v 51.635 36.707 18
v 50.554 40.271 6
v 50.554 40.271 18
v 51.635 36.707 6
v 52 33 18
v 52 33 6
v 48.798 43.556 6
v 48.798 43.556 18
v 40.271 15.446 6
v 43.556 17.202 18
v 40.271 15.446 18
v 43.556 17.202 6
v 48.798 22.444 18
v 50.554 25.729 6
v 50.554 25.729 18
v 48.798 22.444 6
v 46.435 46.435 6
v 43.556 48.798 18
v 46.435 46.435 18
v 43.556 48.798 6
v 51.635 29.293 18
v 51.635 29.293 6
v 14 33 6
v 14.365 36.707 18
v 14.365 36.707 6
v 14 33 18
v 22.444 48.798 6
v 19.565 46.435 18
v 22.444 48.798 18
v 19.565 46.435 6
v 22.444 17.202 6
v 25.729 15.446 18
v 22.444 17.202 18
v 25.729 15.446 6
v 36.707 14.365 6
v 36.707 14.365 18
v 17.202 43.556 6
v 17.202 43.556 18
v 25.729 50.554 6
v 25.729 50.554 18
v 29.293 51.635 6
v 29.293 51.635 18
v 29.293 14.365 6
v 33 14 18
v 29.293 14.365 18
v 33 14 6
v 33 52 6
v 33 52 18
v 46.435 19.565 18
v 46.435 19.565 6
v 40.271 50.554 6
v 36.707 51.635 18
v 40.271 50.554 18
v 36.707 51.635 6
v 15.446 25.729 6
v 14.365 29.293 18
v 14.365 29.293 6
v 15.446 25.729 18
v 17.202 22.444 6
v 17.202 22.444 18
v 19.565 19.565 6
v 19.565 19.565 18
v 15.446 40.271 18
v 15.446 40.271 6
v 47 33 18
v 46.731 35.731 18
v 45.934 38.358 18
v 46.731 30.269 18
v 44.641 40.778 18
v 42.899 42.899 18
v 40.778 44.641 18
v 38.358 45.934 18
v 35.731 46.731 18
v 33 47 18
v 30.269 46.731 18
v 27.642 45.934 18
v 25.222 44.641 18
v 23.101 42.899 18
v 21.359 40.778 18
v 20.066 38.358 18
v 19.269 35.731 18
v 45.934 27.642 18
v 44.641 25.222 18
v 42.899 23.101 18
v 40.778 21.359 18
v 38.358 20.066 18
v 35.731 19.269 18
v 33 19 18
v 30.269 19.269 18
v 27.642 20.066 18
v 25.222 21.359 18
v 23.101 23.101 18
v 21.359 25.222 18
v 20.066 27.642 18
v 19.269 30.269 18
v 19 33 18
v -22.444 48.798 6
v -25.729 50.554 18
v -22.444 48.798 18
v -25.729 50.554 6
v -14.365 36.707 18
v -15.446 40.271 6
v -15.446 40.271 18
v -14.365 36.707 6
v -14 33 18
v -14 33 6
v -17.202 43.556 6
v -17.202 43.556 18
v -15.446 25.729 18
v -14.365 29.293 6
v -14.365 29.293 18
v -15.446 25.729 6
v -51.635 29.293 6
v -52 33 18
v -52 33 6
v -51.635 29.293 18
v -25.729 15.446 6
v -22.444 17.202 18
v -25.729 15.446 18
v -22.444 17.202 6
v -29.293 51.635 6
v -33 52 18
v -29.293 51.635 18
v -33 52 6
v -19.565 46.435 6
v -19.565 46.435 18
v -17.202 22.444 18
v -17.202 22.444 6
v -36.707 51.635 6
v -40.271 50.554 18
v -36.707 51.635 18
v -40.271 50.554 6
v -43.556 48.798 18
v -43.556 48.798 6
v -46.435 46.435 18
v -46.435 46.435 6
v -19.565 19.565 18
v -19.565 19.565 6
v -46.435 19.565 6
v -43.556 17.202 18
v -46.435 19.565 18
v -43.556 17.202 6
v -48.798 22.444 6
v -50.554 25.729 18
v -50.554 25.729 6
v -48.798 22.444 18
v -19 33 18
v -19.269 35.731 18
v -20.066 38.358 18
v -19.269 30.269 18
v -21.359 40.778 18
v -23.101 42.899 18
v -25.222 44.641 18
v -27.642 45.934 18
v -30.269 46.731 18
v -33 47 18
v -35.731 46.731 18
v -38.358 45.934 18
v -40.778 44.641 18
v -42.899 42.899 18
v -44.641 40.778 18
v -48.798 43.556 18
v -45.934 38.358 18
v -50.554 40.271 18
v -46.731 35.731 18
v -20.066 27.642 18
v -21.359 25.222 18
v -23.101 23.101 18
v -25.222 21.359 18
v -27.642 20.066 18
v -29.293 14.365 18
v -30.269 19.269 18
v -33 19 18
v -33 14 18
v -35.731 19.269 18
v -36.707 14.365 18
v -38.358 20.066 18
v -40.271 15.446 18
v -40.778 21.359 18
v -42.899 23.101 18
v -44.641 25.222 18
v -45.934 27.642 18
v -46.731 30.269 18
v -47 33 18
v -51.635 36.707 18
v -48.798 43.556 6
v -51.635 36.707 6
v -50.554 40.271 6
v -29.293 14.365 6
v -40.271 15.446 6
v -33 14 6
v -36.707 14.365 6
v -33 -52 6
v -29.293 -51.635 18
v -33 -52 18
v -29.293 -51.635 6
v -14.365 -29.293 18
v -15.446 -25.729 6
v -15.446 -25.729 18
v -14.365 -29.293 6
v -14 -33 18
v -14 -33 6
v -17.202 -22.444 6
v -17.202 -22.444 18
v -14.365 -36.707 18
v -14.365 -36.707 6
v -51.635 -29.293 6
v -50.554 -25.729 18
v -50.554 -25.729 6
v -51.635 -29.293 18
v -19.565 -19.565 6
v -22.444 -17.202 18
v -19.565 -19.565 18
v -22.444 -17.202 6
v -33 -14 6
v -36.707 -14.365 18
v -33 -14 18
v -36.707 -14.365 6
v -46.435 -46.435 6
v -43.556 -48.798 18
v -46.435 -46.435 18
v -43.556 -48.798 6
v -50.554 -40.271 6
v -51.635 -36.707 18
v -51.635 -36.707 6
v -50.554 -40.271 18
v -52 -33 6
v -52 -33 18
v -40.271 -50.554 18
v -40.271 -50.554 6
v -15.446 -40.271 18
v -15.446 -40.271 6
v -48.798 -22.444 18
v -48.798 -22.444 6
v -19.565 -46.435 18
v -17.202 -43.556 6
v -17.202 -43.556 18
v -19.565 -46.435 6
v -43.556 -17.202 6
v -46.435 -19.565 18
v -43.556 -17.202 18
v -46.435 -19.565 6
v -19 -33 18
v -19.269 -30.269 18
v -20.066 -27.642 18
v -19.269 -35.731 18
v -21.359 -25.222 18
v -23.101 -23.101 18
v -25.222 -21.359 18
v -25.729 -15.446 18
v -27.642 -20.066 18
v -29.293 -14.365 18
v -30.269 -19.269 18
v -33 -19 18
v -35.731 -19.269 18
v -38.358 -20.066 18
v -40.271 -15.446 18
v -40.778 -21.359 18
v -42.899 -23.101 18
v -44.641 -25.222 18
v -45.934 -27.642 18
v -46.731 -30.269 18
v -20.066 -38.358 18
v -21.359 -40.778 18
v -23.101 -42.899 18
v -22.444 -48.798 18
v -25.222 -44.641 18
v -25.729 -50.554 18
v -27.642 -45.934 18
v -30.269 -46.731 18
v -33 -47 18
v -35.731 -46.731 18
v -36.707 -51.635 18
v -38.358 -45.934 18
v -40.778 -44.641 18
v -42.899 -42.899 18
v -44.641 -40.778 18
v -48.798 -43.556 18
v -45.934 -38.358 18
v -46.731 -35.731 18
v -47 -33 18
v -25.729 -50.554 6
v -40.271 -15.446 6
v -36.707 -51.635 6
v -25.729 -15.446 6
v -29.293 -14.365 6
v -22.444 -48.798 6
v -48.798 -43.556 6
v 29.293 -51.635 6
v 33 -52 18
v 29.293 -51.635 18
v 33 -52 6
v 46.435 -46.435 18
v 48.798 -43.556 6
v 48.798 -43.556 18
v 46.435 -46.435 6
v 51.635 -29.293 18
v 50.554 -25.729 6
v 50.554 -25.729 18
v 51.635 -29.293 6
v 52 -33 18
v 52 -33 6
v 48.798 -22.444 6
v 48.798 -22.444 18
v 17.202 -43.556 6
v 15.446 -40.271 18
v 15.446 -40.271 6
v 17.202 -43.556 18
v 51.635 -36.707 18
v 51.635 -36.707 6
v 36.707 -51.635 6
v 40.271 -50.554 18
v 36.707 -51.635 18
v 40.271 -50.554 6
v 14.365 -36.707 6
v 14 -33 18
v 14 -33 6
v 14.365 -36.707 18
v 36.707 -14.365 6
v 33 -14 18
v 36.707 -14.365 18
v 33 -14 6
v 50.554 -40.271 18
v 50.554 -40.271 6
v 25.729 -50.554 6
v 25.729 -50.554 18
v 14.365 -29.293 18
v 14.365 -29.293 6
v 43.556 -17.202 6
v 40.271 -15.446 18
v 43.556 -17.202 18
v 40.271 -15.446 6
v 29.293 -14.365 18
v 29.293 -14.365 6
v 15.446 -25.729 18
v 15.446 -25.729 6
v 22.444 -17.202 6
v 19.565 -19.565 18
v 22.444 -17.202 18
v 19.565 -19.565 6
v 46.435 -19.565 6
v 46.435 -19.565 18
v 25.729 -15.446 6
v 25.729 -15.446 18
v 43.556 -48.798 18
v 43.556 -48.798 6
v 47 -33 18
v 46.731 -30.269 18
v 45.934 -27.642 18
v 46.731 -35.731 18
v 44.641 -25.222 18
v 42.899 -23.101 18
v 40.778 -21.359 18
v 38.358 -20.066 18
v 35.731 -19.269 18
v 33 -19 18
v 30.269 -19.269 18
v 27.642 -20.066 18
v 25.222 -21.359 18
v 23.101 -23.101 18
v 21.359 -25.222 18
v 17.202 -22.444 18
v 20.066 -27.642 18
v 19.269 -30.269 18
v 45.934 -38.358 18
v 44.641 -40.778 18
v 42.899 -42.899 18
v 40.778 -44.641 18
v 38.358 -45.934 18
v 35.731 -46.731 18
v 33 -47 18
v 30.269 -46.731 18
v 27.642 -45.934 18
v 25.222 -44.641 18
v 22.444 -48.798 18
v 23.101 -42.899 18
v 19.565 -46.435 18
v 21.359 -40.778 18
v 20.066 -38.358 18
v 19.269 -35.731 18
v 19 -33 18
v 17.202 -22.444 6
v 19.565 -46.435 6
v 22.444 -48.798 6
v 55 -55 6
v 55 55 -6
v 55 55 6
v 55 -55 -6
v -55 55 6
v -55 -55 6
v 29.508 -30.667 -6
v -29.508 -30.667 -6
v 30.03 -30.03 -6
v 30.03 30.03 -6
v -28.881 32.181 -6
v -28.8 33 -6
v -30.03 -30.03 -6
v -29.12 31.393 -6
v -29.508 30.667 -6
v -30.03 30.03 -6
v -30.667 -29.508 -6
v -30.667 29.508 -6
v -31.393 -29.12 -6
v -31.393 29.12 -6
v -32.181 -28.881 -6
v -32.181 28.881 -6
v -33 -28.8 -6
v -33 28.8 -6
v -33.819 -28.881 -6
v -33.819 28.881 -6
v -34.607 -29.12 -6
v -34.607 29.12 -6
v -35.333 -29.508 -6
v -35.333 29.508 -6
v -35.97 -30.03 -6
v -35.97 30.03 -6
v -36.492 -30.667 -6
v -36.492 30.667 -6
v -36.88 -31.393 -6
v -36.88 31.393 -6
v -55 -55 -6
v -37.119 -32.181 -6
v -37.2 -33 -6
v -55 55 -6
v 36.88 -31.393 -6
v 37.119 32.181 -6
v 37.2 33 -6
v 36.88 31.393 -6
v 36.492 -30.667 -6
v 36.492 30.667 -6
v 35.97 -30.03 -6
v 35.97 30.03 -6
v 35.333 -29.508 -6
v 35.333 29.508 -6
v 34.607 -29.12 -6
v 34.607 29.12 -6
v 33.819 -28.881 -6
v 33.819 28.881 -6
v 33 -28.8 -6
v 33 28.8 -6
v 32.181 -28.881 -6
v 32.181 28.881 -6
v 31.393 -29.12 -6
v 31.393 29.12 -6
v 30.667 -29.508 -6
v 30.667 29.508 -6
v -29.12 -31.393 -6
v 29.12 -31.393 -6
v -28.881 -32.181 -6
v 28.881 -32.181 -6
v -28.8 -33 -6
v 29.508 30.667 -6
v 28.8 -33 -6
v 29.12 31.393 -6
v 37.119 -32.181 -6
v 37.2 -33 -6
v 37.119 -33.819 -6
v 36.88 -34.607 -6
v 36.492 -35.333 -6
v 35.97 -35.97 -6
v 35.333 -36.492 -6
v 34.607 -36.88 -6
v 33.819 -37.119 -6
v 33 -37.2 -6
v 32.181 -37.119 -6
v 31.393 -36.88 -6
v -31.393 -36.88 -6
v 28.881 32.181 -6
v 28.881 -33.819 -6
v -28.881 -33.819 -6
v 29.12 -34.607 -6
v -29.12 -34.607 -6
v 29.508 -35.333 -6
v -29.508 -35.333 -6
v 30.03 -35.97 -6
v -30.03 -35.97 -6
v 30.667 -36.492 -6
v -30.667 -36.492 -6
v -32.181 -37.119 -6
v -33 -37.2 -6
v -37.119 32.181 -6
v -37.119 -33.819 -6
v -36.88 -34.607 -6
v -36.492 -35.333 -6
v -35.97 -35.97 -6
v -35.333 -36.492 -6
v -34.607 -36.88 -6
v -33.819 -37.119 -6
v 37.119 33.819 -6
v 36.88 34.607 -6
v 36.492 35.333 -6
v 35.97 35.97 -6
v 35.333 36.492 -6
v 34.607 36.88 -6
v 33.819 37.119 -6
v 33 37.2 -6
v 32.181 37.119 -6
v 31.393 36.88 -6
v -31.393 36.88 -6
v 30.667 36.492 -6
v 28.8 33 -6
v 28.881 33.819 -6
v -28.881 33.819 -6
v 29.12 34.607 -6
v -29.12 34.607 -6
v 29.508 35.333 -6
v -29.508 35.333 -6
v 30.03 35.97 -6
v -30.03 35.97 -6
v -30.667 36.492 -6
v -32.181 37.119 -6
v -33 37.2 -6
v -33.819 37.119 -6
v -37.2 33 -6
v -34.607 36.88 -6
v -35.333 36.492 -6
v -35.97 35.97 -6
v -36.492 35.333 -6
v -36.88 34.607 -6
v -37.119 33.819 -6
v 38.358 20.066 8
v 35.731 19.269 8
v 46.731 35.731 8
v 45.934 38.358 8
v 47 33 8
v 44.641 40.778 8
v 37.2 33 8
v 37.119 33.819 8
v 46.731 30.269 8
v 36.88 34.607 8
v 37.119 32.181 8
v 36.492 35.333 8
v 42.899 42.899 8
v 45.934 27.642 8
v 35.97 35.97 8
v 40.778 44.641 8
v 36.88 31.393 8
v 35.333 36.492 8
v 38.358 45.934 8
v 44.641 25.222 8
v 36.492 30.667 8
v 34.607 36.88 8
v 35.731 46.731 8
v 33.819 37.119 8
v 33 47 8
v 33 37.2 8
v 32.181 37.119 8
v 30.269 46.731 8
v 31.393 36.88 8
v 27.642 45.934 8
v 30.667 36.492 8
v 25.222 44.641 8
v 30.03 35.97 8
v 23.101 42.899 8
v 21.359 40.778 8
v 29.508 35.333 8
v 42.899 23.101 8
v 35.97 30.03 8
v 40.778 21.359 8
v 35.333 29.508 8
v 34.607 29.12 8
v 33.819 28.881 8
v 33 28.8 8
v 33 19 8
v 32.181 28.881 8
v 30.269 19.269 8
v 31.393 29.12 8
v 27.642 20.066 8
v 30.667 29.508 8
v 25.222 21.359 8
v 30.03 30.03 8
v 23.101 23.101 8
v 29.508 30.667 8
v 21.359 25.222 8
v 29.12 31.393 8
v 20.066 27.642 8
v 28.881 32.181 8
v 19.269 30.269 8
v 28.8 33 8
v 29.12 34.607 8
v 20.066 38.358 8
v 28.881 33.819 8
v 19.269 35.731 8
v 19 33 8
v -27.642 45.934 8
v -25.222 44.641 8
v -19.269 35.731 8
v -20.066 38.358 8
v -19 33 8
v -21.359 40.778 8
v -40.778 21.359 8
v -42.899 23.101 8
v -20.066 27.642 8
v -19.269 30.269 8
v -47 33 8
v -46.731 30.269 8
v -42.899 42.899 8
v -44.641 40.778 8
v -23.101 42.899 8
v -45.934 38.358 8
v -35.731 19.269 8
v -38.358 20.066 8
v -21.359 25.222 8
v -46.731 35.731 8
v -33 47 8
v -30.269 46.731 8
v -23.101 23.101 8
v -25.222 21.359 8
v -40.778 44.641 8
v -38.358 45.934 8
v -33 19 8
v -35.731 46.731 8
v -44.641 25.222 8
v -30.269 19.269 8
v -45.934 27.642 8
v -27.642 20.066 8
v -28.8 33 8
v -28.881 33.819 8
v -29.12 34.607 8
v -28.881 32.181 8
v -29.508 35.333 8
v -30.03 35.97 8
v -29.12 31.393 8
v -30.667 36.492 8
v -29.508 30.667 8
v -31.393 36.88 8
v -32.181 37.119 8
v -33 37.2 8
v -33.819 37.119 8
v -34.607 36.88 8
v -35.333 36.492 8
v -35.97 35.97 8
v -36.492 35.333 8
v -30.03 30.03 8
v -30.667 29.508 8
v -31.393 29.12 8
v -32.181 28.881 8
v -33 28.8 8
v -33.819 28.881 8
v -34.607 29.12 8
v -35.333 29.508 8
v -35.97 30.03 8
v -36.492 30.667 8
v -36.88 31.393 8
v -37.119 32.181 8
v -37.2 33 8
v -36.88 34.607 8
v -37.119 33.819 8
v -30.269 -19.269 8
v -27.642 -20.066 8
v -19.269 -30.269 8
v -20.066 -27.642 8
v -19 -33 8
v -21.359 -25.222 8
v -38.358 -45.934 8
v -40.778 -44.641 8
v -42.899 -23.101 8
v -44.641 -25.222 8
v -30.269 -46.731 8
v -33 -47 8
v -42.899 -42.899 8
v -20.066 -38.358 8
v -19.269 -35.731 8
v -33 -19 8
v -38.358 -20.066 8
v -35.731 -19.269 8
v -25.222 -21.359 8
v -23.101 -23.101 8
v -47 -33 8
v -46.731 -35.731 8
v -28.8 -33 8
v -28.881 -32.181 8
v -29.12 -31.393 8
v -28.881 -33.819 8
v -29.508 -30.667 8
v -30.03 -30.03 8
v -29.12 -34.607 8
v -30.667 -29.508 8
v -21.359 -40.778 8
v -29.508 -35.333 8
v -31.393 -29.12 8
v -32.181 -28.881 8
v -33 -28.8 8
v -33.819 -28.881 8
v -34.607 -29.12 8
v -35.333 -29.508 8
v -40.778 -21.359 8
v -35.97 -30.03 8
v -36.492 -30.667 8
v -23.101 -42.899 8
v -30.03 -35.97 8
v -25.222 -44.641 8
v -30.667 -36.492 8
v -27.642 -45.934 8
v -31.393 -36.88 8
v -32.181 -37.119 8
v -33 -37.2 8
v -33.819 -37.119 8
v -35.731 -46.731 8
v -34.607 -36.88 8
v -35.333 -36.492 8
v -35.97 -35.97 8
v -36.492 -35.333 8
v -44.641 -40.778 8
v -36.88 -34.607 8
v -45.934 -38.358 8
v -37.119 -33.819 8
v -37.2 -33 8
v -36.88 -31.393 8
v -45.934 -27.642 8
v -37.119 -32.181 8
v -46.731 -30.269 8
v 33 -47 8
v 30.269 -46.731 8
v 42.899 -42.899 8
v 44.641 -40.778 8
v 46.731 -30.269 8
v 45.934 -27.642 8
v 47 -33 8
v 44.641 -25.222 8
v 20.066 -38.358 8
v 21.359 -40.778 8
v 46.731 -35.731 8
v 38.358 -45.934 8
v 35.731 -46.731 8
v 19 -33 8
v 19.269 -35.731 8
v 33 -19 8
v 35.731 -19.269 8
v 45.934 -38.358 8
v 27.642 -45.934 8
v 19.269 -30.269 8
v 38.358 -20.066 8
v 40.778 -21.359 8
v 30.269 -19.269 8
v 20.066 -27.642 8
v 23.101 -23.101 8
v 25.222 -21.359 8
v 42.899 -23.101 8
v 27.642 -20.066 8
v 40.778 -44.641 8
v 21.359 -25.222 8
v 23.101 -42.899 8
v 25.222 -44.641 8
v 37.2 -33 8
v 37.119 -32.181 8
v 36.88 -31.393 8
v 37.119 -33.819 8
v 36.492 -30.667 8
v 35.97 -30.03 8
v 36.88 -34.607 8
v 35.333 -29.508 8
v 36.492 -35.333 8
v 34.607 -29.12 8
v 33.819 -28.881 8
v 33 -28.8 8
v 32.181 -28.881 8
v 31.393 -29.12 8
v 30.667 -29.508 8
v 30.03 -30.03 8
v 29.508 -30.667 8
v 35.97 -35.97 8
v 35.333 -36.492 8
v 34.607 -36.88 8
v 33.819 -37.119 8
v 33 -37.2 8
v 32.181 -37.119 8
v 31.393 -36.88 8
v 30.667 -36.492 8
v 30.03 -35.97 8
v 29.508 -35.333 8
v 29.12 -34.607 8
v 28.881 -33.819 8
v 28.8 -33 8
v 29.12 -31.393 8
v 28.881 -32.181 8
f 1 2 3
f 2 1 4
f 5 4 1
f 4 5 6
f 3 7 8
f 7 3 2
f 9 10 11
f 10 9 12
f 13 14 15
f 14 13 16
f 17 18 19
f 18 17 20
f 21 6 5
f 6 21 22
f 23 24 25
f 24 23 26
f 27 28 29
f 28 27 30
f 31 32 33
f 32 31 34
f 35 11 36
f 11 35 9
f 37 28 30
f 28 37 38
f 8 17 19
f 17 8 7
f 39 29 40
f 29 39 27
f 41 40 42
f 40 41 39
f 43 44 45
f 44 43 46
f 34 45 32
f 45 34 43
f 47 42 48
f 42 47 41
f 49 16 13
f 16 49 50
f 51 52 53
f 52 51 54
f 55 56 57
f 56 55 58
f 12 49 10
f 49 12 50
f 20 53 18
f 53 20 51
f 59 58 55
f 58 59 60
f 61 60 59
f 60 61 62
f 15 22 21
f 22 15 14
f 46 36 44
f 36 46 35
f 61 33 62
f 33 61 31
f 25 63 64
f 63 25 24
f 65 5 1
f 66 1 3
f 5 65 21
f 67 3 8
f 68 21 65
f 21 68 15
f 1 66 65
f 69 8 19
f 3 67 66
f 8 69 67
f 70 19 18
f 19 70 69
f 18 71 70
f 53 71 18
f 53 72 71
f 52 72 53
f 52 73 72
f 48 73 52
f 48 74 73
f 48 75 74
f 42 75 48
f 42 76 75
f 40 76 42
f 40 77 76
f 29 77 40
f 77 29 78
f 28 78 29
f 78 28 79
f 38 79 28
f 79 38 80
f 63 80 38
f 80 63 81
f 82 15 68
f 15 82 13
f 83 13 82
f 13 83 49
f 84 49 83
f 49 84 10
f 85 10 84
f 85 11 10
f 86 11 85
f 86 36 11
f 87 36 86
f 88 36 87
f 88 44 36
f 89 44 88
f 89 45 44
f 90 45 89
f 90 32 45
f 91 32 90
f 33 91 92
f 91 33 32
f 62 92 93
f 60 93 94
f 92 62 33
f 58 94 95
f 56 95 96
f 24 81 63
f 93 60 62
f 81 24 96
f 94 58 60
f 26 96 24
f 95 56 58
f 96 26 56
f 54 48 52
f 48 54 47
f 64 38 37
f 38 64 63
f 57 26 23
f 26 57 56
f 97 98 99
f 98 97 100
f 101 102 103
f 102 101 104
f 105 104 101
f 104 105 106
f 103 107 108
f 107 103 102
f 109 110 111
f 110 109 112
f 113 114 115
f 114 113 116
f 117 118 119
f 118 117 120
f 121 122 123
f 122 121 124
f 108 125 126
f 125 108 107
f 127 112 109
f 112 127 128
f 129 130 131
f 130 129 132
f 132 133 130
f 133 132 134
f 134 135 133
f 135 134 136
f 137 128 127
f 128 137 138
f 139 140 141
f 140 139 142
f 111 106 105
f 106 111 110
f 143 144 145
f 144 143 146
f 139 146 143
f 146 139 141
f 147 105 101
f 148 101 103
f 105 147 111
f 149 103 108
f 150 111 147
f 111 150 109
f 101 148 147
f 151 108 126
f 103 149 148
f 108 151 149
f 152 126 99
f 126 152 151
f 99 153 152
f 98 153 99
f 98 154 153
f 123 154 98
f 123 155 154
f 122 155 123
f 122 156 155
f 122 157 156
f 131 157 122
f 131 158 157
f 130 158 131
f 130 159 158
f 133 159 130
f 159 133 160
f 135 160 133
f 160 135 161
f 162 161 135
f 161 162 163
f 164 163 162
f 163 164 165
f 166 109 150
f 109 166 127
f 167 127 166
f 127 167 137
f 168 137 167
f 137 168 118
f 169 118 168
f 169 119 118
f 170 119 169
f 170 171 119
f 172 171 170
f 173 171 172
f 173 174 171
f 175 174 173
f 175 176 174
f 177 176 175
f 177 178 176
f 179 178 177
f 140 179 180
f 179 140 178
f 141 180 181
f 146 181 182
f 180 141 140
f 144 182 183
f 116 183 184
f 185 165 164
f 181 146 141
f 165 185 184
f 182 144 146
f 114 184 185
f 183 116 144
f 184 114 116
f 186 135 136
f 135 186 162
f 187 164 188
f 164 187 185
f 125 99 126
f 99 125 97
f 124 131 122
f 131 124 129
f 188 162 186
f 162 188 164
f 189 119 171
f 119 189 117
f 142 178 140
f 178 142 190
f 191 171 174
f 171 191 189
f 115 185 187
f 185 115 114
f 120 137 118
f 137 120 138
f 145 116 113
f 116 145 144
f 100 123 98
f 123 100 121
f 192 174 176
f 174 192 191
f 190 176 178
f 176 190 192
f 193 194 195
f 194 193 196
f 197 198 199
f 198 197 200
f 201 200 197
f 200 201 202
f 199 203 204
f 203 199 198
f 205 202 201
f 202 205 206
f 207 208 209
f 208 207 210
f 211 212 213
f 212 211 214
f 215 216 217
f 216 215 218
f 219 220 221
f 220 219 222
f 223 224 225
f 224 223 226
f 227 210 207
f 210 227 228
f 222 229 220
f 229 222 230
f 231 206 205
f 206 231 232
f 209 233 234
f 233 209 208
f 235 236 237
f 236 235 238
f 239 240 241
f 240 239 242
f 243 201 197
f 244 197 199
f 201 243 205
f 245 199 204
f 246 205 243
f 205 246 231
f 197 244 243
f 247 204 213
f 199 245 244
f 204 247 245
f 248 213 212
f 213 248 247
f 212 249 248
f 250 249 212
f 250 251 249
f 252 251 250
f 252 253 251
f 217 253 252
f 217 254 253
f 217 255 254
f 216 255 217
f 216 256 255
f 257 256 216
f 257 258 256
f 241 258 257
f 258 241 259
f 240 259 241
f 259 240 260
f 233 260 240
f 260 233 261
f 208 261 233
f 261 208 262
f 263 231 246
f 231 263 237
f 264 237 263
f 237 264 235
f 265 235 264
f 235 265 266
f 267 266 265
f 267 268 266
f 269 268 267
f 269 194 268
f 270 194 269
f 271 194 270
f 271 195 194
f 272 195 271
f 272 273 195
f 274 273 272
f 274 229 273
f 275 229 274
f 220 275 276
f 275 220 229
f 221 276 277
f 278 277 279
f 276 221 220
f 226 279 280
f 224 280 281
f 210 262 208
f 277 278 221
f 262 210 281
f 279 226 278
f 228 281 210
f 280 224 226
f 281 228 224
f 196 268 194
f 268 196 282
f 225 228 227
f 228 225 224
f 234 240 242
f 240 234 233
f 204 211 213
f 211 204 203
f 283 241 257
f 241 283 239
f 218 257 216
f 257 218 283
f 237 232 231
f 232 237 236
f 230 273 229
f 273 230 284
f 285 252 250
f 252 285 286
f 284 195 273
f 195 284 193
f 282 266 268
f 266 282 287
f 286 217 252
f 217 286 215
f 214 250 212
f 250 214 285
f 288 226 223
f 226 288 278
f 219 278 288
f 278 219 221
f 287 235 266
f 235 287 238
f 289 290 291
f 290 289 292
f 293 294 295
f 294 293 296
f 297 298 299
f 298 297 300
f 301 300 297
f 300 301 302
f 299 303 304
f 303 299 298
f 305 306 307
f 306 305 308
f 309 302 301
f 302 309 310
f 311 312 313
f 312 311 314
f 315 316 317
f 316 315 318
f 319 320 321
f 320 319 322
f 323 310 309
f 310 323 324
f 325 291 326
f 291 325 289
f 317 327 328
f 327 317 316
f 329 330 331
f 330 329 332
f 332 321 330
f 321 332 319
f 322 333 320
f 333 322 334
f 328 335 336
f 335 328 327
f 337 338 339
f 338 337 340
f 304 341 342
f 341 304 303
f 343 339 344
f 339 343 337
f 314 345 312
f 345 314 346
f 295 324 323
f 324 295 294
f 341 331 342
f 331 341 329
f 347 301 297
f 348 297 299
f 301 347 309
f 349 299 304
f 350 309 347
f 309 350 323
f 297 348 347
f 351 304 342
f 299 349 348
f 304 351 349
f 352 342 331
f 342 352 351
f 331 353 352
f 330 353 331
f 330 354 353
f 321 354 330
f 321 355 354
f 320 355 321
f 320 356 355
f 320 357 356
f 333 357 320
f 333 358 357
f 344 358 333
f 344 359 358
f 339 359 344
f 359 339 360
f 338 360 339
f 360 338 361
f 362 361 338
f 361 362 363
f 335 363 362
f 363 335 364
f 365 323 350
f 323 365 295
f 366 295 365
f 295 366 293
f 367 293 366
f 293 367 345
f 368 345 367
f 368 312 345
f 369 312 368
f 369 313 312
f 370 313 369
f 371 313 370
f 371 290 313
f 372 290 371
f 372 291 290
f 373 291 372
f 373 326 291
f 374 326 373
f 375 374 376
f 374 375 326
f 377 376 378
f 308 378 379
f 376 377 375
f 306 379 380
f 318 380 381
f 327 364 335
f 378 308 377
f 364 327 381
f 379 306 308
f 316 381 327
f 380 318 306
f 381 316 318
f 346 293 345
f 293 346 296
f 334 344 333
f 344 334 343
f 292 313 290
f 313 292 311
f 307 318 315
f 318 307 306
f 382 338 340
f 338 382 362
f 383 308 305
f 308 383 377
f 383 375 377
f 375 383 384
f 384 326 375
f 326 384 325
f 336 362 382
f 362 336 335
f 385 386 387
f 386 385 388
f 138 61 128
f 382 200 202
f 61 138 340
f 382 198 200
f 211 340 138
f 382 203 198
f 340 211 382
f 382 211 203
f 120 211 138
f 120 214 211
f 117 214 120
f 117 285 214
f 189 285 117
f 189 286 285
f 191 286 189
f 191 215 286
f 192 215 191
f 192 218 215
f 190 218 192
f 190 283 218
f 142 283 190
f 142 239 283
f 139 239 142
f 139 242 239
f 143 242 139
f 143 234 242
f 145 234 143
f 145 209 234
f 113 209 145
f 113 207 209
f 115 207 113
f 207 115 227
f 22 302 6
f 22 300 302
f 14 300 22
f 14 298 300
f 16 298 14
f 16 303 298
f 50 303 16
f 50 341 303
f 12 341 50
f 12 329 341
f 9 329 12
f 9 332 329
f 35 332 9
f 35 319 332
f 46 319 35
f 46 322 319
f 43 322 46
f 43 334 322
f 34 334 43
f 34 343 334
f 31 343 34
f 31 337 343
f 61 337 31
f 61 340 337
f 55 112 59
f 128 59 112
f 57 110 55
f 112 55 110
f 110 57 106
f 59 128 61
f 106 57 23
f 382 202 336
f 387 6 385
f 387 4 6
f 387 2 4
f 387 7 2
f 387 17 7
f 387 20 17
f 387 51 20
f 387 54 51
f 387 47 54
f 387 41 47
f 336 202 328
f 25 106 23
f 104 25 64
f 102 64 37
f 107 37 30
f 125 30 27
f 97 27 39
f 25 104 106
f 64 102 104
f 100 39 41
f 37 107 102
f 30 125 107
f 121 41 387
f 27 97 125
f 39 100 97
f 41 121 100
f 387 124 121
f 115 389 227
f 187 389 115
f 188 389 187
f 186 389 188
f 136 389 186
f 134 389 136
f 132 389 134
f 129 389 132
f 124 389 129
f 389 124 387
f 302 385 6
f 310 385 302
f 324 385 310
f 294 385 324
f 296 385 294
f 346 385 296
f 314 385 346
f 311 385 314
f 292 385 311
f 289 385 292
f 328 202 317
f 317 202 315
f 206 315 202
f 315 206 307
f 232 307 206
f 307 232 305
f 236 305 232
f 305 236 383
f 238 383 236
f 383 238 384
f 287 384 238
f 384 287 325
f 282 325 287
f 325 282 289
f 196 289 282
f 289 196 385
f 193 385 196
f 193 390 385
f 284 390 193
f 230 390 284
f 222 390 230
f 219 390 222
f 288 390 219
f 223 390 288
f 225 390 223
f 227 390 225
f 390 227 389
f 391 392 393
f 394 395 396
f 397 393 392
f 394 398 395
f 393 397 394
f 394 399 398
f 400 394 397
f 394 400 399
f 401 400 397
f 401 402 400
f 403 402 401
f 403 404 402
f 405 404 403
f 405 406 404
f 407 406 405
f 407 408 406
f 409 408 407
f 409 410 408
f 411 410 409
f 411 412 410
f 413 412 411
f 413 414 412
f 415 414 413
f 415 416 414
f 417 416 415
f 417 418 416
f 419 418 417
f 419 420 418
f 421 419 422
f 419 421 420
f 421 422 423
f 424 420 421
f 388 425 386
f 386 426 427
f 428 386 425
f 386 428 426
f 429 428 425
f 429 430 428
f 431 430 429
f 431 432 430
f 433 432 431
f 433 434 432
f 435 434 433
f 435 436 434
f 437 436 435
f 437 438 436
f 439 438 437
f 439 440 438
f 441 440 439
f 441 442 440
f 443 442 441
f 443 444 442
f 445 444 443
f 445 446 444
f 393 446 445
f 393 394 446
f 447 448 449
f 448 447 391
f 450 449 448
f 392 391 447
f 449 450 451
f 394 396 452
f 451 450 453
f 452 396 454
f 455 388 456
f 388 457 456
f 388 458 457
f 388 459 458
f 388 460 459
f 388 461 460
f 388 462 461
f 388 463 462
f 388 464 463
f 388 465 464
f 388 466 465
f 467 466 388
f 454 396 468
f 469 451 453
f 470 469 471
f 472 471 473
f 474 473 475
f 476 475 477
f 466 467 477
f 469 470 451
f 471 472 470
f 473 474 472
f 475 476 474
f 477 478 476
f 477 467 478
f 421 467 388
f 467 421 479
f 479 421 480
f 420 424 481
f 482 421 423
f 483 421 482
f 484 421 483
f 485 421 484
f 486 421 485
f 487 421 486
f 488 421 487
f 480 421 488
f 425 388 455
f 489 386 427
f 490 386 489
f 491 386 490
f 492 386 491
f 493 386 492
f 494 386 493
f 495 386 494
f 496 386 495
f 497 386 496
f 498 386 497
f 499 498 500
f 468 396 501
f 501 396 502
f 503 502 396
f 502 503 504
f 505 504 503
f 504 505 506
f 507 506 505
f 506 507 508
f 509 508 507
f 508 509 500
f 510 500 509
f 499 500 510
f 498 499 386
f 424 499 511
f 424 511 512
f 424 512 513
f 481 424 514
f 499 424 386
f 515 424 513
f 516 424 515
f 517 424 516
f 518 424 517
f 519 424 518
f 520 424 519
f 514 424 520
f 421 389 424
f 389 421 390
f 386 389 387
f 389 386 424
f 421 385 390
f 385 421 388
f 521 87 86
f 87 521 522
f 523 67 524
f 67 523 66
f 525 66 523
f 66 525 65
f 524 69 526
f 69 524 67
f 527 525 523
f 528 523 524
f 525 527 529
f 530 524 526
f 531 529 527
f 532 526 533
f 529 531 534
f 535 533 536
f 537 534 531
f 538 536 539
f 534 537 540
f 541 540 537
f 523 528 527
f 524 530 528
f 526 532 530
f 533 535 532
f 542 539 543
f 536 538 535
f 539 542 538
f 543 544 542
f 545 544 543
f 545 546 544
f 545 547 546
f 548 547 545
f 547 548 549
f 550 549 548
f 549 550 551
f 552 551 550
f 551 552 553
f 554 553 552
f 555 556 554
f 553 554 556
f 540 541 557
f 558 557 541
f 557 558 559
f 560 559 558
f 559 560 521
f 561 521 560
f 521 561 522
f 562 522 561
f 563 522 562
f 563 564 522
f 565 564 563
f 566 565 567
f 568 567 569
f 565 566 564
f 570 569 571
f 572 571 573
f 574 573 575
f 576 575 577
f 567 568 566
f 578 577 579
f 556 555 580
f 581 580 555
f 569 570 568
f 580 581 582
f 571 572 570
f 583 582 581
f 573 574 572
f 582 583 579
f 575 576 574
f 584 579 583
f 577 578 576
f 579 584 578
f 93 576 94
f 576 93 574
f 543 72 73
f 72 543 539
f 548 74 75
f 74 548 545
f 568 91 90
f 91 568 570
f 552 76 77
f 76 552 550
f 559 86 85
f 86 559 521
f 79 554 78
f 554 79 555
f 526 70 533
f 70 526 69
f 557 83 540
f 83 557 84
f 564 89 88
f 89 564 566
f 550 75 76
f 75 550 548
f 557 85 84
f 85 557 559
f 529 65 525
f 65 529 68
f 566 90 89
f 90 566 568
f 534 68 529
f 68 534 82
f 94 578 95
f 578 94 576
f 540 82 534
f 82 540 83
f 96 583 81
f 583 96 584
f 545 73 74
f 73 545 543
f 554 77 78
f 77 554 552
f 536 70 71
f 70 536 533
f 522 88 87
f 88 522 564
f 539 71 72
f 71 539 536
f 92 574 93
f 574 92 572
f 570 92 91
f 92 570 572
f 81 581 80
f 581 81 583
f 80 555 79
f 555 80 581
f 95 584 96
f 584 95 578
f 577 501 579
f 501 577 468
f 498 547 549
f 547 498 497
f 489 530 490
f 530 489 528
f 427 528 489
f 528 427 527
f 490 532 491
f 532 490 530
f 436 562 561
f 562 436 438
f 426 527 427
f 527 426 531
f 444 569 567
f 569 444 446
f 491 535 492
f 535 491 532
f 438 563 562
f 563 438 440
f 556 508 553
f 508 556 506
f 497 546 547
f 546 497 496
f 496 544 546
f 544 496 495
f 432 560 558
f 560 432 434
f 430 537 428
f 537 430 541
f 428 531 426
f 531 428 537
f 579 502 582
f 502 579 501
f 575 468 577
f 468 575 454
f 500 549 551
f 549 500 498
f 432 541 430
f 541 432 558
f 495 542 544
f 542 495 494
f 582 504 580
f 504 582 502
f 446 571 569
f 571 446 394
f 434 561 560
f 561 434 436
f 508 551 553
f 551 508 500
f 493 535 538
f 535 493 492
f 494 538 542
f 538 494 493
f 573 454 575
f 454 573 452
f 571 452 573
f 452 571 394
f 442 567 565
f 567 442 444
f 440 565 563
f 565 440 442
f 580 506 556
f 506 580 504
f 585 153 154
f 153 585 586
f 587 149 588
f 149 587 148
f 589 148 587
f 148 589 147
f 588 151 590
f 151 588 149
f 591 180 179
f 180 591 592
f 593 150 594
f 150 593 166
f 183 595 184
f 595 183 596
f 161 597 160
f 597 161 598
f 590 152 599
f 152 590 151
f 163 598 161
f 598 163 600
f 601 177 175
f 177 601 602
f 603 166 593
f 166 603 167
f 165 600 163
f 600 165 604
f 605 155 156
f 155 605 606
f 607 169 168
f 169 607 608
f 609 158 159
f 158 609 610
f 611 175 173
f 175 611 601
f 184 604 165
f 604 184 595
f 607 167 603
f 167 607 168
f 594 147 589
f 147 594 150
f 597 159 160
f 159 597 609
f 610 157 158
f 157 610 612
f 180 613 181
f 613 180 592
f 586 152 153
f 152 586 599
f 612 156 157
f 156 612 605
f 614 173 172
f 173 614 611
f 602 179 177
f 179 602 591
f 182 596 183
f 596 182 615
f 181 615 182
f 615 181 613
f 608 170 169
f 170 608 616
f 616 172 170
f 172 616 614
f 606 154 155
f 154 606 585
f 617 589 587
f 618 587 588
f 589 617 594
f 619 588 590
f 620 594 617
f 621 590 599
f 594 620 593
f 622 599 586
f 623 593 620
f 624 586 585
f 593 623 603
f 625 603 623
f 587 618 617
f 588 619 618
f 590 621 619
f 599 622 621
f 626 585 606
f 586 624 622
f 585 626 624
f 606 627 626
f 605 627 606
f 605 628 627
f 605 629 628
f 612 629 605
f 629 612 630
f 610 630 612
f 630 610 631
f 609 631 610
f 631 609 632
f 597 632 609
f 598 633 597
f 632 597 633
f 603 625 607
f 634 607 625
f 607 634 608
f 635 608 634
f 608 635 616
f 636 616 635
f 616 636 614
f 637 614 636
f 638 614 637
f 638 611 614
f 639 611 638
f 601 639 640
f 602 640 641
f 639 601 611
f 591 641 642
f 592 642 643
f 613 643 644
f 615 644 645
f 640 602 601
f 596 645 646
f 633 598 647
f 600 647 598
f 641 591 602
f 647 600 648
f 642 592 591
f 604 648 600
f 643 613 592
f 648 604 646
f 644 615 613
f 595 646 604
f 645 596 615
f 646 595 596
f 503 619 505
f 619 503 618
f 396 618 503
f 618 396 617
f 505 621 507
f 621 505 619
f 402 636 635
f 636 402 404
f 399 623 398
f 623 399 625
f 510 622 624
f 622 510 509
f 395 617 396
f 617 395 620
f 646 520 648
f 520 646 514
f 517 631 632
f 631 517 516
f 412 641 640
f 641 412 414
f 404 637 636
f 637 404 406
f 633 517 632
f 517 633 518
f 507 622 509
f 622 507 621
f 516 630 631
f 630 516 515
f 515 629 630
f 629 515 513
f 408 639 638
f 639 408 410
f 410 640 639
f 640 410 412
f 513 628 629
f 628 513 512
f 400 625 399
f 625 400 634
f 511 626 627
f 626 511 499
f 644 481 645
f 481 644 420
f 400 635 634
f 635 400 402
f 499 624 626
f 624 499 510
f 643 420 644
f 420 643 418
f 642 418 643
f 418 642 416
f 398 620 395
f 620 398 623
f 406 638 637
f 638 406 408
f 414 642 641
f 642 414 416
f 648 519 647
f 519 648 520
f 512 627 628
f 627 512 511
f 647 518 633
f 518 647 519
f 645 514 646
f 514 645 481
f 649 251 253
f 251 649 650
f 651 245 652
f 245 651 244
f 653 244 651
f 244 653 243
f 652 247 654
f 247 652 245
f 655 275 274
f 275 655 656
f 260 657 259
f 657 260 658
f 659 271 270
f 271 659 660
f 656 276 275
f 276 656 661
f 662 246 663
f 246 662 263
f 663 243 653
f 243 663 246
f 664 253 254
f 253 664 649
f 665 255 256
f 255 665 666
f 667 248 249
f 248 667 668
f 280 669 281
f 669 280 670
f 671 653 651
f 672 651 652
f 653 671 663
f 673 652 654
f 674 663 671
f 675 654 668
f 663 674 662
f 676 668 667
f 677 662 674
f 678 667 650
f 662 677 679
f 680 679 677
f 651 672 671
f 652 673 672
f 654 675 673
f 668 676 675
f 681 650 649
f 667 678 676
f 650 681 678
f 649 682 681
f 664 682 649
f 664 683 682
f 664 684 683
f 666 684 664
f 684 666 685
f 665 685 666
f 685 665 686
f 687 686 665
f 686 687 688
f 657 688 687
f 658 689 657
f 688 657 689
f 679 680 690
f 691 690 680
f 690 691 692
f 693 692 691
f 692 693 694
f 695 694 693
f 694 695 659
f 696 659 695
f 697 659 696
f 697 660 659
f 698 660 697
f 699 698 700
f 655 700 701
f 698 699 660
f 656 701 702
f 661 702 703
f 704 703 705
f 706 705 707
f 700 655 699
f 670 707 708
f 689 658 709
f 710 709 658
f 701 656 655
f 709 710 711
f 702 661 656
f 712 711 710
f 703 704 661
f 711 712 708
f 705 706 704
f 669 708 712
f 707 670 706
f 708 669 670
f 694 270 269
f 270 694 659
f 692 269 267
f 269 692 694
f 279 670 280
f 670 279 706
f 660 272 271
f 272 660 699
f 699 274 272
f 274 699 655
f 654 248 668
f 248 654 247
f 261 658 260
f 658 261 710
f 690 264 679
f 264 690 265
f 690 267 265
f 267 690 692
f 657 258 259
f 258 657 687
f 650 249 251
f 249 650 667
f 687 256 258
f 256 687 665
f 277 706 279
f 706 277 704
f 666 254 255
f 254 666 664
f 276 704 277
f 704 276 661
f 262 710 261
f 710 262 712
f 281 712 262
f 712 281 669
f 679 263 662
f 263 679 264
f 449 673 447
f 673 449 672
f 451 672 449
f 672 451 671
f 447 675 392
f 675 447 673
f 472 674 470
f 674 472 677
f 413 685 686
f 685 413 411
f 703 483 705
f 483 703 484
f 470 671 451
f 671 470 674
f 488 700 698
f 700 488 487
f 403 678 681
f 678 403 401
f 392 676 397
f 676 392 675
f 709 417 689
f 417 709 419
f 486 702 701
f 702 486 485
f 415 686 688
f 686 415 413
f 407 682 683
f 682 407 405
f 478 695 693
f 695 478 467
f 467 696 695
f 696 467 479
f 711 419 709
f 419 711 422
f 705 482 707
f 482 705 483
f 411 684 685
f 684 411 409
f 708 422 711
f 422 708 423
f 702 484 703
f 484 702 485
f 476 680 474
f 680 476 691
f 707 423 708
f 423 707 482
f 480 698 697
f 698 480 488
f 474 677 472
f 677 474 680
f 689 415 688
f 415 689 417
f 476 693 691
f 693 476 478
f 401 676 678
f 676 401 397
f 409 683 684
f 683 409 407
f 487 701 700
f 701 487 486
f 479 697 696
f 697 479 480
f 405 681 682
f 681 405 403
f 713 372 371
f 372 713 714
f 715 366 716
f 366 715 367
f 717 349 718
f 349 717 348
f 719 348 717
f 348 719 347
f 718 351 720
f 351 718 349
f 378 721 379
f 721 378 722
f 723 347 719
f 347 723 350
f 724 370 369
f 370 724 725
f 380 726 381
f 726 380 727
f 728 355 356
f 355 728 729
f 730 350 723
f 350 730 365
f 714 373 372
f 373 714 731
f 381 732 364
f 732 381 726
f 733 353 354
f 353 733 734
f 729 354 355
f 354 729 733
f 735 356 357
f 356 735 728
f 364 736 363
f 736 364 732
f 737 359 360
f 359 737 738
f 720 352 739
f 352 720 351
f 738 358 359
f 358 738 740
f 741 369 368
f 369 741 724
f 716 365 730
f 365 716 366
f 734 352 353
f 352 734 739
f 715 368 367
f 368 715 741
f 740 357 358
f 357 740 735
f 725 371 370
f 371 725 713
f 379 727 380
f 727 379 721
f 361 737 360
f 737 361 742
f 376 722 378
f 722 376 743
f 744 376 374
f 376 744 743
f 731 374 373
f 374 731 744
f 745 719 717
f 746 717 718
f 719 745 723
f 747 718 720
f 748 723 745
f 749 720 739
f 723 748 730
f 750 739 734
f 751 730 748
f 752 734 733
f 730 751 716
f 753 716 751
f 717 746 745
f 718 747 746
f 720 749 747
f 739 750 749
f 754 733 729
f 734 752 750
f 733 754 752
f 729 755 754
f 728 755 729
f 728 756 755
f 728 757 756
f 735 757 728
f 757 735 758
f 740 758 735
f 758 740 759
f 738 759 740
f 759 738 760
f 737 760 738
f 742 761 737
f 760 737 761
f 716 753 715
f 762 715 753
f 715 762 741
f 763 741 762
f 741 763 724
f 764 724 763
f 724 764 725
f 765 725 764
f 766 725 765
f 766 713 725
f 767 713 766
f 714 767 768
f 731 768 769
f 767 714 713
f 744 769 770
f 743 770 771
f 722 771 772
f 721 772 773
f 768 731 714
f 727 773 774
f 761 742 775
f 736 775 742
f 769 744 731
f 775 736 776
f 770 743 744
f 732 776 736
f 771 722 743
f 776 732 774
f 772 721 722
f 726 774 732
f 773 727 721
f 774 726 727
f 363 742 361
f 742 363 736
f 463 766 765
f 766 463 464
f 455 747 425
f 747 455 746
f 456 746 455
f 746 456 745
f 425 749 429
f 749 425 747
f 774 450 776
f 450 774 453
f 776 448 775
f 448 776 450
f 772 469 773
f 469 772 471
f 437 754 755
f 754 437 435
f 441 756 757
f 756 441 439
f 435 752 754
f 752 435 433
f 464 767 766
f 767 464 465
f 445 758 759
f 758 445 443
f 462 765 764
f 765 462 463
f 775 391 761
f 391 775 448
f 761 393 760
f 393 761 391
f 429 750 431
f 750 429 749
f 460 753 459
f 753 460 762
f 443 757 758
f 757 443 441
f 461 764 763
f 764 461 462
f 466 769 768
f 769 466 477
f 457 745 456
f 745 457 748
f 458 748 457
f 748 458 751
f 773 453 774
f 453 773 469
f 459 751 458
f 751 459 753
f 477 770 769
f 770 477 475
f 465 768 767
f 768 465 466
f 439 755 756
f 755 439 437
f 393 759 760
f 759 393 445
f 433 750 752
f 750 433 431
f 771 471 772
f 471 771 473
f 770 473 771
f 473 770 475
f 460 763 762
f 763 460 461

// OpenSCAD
$fn = 32;

// ----------------------------------------------------------------------
// Socket pad plate
// bosses with counterbored sockets for the screws
// ----------------------------------------------------------------------

// --- parameters (mm) ---
base_t = 12;             // base plate thickness
boss_h = 12;             // boss height above the base plate
boss_d = 38;             // boss diameter
socket_d = 28;           // socket diameter
socket_depth = 10;       // socket depth from the boss face
bolt_d = 8.4;            // screw clearance hole through the socket floor
plate = [110, 110, 12];  // overall size (x, y, z)
edge = 22;               // boss centre offset from the plate edge
pads = 4;                // boss count, one per corner

// --- derived feature positions (mm) ---
height = base_t + boss_h;        // = 24   overall height of the part
corner_x = plate[0] / 2 - edge;  // = 33   boss centre X
corner_y = plate[1] / 2 - edge;  // = 33   boss centre Y
feature_centers = [
  [corner_x, corner_y],
  [-corner_x, corner_y],
  [-corner_x, -corner_y],
  [corner_x, -corner_y]
];   // boss centres: sockets, holes and the pads themselves are placed from here

// base plate, bosses on feature_centers, socket + through hole in each
difference() {
  union() {
    cube(plate, center = true);
    for (centre = feature_centers)
      translate([centre[0], centre[1], plate[2] / 2 - 1])
        cylinder(d = boss_d, h = boss_h + 1);
  }
  for (centre = feature_centers) {
    translate([centre[0], centre[1], plate[2] / 2 + boss_h - socket_depth])
      cylinder(d = socket_d, h = socket_depth + 1);
    translate([centre[0], centre[1], -height])
      cylinder(d = bolt_d, h = 2 * height + 2);  // through the socket floor
  }
}
